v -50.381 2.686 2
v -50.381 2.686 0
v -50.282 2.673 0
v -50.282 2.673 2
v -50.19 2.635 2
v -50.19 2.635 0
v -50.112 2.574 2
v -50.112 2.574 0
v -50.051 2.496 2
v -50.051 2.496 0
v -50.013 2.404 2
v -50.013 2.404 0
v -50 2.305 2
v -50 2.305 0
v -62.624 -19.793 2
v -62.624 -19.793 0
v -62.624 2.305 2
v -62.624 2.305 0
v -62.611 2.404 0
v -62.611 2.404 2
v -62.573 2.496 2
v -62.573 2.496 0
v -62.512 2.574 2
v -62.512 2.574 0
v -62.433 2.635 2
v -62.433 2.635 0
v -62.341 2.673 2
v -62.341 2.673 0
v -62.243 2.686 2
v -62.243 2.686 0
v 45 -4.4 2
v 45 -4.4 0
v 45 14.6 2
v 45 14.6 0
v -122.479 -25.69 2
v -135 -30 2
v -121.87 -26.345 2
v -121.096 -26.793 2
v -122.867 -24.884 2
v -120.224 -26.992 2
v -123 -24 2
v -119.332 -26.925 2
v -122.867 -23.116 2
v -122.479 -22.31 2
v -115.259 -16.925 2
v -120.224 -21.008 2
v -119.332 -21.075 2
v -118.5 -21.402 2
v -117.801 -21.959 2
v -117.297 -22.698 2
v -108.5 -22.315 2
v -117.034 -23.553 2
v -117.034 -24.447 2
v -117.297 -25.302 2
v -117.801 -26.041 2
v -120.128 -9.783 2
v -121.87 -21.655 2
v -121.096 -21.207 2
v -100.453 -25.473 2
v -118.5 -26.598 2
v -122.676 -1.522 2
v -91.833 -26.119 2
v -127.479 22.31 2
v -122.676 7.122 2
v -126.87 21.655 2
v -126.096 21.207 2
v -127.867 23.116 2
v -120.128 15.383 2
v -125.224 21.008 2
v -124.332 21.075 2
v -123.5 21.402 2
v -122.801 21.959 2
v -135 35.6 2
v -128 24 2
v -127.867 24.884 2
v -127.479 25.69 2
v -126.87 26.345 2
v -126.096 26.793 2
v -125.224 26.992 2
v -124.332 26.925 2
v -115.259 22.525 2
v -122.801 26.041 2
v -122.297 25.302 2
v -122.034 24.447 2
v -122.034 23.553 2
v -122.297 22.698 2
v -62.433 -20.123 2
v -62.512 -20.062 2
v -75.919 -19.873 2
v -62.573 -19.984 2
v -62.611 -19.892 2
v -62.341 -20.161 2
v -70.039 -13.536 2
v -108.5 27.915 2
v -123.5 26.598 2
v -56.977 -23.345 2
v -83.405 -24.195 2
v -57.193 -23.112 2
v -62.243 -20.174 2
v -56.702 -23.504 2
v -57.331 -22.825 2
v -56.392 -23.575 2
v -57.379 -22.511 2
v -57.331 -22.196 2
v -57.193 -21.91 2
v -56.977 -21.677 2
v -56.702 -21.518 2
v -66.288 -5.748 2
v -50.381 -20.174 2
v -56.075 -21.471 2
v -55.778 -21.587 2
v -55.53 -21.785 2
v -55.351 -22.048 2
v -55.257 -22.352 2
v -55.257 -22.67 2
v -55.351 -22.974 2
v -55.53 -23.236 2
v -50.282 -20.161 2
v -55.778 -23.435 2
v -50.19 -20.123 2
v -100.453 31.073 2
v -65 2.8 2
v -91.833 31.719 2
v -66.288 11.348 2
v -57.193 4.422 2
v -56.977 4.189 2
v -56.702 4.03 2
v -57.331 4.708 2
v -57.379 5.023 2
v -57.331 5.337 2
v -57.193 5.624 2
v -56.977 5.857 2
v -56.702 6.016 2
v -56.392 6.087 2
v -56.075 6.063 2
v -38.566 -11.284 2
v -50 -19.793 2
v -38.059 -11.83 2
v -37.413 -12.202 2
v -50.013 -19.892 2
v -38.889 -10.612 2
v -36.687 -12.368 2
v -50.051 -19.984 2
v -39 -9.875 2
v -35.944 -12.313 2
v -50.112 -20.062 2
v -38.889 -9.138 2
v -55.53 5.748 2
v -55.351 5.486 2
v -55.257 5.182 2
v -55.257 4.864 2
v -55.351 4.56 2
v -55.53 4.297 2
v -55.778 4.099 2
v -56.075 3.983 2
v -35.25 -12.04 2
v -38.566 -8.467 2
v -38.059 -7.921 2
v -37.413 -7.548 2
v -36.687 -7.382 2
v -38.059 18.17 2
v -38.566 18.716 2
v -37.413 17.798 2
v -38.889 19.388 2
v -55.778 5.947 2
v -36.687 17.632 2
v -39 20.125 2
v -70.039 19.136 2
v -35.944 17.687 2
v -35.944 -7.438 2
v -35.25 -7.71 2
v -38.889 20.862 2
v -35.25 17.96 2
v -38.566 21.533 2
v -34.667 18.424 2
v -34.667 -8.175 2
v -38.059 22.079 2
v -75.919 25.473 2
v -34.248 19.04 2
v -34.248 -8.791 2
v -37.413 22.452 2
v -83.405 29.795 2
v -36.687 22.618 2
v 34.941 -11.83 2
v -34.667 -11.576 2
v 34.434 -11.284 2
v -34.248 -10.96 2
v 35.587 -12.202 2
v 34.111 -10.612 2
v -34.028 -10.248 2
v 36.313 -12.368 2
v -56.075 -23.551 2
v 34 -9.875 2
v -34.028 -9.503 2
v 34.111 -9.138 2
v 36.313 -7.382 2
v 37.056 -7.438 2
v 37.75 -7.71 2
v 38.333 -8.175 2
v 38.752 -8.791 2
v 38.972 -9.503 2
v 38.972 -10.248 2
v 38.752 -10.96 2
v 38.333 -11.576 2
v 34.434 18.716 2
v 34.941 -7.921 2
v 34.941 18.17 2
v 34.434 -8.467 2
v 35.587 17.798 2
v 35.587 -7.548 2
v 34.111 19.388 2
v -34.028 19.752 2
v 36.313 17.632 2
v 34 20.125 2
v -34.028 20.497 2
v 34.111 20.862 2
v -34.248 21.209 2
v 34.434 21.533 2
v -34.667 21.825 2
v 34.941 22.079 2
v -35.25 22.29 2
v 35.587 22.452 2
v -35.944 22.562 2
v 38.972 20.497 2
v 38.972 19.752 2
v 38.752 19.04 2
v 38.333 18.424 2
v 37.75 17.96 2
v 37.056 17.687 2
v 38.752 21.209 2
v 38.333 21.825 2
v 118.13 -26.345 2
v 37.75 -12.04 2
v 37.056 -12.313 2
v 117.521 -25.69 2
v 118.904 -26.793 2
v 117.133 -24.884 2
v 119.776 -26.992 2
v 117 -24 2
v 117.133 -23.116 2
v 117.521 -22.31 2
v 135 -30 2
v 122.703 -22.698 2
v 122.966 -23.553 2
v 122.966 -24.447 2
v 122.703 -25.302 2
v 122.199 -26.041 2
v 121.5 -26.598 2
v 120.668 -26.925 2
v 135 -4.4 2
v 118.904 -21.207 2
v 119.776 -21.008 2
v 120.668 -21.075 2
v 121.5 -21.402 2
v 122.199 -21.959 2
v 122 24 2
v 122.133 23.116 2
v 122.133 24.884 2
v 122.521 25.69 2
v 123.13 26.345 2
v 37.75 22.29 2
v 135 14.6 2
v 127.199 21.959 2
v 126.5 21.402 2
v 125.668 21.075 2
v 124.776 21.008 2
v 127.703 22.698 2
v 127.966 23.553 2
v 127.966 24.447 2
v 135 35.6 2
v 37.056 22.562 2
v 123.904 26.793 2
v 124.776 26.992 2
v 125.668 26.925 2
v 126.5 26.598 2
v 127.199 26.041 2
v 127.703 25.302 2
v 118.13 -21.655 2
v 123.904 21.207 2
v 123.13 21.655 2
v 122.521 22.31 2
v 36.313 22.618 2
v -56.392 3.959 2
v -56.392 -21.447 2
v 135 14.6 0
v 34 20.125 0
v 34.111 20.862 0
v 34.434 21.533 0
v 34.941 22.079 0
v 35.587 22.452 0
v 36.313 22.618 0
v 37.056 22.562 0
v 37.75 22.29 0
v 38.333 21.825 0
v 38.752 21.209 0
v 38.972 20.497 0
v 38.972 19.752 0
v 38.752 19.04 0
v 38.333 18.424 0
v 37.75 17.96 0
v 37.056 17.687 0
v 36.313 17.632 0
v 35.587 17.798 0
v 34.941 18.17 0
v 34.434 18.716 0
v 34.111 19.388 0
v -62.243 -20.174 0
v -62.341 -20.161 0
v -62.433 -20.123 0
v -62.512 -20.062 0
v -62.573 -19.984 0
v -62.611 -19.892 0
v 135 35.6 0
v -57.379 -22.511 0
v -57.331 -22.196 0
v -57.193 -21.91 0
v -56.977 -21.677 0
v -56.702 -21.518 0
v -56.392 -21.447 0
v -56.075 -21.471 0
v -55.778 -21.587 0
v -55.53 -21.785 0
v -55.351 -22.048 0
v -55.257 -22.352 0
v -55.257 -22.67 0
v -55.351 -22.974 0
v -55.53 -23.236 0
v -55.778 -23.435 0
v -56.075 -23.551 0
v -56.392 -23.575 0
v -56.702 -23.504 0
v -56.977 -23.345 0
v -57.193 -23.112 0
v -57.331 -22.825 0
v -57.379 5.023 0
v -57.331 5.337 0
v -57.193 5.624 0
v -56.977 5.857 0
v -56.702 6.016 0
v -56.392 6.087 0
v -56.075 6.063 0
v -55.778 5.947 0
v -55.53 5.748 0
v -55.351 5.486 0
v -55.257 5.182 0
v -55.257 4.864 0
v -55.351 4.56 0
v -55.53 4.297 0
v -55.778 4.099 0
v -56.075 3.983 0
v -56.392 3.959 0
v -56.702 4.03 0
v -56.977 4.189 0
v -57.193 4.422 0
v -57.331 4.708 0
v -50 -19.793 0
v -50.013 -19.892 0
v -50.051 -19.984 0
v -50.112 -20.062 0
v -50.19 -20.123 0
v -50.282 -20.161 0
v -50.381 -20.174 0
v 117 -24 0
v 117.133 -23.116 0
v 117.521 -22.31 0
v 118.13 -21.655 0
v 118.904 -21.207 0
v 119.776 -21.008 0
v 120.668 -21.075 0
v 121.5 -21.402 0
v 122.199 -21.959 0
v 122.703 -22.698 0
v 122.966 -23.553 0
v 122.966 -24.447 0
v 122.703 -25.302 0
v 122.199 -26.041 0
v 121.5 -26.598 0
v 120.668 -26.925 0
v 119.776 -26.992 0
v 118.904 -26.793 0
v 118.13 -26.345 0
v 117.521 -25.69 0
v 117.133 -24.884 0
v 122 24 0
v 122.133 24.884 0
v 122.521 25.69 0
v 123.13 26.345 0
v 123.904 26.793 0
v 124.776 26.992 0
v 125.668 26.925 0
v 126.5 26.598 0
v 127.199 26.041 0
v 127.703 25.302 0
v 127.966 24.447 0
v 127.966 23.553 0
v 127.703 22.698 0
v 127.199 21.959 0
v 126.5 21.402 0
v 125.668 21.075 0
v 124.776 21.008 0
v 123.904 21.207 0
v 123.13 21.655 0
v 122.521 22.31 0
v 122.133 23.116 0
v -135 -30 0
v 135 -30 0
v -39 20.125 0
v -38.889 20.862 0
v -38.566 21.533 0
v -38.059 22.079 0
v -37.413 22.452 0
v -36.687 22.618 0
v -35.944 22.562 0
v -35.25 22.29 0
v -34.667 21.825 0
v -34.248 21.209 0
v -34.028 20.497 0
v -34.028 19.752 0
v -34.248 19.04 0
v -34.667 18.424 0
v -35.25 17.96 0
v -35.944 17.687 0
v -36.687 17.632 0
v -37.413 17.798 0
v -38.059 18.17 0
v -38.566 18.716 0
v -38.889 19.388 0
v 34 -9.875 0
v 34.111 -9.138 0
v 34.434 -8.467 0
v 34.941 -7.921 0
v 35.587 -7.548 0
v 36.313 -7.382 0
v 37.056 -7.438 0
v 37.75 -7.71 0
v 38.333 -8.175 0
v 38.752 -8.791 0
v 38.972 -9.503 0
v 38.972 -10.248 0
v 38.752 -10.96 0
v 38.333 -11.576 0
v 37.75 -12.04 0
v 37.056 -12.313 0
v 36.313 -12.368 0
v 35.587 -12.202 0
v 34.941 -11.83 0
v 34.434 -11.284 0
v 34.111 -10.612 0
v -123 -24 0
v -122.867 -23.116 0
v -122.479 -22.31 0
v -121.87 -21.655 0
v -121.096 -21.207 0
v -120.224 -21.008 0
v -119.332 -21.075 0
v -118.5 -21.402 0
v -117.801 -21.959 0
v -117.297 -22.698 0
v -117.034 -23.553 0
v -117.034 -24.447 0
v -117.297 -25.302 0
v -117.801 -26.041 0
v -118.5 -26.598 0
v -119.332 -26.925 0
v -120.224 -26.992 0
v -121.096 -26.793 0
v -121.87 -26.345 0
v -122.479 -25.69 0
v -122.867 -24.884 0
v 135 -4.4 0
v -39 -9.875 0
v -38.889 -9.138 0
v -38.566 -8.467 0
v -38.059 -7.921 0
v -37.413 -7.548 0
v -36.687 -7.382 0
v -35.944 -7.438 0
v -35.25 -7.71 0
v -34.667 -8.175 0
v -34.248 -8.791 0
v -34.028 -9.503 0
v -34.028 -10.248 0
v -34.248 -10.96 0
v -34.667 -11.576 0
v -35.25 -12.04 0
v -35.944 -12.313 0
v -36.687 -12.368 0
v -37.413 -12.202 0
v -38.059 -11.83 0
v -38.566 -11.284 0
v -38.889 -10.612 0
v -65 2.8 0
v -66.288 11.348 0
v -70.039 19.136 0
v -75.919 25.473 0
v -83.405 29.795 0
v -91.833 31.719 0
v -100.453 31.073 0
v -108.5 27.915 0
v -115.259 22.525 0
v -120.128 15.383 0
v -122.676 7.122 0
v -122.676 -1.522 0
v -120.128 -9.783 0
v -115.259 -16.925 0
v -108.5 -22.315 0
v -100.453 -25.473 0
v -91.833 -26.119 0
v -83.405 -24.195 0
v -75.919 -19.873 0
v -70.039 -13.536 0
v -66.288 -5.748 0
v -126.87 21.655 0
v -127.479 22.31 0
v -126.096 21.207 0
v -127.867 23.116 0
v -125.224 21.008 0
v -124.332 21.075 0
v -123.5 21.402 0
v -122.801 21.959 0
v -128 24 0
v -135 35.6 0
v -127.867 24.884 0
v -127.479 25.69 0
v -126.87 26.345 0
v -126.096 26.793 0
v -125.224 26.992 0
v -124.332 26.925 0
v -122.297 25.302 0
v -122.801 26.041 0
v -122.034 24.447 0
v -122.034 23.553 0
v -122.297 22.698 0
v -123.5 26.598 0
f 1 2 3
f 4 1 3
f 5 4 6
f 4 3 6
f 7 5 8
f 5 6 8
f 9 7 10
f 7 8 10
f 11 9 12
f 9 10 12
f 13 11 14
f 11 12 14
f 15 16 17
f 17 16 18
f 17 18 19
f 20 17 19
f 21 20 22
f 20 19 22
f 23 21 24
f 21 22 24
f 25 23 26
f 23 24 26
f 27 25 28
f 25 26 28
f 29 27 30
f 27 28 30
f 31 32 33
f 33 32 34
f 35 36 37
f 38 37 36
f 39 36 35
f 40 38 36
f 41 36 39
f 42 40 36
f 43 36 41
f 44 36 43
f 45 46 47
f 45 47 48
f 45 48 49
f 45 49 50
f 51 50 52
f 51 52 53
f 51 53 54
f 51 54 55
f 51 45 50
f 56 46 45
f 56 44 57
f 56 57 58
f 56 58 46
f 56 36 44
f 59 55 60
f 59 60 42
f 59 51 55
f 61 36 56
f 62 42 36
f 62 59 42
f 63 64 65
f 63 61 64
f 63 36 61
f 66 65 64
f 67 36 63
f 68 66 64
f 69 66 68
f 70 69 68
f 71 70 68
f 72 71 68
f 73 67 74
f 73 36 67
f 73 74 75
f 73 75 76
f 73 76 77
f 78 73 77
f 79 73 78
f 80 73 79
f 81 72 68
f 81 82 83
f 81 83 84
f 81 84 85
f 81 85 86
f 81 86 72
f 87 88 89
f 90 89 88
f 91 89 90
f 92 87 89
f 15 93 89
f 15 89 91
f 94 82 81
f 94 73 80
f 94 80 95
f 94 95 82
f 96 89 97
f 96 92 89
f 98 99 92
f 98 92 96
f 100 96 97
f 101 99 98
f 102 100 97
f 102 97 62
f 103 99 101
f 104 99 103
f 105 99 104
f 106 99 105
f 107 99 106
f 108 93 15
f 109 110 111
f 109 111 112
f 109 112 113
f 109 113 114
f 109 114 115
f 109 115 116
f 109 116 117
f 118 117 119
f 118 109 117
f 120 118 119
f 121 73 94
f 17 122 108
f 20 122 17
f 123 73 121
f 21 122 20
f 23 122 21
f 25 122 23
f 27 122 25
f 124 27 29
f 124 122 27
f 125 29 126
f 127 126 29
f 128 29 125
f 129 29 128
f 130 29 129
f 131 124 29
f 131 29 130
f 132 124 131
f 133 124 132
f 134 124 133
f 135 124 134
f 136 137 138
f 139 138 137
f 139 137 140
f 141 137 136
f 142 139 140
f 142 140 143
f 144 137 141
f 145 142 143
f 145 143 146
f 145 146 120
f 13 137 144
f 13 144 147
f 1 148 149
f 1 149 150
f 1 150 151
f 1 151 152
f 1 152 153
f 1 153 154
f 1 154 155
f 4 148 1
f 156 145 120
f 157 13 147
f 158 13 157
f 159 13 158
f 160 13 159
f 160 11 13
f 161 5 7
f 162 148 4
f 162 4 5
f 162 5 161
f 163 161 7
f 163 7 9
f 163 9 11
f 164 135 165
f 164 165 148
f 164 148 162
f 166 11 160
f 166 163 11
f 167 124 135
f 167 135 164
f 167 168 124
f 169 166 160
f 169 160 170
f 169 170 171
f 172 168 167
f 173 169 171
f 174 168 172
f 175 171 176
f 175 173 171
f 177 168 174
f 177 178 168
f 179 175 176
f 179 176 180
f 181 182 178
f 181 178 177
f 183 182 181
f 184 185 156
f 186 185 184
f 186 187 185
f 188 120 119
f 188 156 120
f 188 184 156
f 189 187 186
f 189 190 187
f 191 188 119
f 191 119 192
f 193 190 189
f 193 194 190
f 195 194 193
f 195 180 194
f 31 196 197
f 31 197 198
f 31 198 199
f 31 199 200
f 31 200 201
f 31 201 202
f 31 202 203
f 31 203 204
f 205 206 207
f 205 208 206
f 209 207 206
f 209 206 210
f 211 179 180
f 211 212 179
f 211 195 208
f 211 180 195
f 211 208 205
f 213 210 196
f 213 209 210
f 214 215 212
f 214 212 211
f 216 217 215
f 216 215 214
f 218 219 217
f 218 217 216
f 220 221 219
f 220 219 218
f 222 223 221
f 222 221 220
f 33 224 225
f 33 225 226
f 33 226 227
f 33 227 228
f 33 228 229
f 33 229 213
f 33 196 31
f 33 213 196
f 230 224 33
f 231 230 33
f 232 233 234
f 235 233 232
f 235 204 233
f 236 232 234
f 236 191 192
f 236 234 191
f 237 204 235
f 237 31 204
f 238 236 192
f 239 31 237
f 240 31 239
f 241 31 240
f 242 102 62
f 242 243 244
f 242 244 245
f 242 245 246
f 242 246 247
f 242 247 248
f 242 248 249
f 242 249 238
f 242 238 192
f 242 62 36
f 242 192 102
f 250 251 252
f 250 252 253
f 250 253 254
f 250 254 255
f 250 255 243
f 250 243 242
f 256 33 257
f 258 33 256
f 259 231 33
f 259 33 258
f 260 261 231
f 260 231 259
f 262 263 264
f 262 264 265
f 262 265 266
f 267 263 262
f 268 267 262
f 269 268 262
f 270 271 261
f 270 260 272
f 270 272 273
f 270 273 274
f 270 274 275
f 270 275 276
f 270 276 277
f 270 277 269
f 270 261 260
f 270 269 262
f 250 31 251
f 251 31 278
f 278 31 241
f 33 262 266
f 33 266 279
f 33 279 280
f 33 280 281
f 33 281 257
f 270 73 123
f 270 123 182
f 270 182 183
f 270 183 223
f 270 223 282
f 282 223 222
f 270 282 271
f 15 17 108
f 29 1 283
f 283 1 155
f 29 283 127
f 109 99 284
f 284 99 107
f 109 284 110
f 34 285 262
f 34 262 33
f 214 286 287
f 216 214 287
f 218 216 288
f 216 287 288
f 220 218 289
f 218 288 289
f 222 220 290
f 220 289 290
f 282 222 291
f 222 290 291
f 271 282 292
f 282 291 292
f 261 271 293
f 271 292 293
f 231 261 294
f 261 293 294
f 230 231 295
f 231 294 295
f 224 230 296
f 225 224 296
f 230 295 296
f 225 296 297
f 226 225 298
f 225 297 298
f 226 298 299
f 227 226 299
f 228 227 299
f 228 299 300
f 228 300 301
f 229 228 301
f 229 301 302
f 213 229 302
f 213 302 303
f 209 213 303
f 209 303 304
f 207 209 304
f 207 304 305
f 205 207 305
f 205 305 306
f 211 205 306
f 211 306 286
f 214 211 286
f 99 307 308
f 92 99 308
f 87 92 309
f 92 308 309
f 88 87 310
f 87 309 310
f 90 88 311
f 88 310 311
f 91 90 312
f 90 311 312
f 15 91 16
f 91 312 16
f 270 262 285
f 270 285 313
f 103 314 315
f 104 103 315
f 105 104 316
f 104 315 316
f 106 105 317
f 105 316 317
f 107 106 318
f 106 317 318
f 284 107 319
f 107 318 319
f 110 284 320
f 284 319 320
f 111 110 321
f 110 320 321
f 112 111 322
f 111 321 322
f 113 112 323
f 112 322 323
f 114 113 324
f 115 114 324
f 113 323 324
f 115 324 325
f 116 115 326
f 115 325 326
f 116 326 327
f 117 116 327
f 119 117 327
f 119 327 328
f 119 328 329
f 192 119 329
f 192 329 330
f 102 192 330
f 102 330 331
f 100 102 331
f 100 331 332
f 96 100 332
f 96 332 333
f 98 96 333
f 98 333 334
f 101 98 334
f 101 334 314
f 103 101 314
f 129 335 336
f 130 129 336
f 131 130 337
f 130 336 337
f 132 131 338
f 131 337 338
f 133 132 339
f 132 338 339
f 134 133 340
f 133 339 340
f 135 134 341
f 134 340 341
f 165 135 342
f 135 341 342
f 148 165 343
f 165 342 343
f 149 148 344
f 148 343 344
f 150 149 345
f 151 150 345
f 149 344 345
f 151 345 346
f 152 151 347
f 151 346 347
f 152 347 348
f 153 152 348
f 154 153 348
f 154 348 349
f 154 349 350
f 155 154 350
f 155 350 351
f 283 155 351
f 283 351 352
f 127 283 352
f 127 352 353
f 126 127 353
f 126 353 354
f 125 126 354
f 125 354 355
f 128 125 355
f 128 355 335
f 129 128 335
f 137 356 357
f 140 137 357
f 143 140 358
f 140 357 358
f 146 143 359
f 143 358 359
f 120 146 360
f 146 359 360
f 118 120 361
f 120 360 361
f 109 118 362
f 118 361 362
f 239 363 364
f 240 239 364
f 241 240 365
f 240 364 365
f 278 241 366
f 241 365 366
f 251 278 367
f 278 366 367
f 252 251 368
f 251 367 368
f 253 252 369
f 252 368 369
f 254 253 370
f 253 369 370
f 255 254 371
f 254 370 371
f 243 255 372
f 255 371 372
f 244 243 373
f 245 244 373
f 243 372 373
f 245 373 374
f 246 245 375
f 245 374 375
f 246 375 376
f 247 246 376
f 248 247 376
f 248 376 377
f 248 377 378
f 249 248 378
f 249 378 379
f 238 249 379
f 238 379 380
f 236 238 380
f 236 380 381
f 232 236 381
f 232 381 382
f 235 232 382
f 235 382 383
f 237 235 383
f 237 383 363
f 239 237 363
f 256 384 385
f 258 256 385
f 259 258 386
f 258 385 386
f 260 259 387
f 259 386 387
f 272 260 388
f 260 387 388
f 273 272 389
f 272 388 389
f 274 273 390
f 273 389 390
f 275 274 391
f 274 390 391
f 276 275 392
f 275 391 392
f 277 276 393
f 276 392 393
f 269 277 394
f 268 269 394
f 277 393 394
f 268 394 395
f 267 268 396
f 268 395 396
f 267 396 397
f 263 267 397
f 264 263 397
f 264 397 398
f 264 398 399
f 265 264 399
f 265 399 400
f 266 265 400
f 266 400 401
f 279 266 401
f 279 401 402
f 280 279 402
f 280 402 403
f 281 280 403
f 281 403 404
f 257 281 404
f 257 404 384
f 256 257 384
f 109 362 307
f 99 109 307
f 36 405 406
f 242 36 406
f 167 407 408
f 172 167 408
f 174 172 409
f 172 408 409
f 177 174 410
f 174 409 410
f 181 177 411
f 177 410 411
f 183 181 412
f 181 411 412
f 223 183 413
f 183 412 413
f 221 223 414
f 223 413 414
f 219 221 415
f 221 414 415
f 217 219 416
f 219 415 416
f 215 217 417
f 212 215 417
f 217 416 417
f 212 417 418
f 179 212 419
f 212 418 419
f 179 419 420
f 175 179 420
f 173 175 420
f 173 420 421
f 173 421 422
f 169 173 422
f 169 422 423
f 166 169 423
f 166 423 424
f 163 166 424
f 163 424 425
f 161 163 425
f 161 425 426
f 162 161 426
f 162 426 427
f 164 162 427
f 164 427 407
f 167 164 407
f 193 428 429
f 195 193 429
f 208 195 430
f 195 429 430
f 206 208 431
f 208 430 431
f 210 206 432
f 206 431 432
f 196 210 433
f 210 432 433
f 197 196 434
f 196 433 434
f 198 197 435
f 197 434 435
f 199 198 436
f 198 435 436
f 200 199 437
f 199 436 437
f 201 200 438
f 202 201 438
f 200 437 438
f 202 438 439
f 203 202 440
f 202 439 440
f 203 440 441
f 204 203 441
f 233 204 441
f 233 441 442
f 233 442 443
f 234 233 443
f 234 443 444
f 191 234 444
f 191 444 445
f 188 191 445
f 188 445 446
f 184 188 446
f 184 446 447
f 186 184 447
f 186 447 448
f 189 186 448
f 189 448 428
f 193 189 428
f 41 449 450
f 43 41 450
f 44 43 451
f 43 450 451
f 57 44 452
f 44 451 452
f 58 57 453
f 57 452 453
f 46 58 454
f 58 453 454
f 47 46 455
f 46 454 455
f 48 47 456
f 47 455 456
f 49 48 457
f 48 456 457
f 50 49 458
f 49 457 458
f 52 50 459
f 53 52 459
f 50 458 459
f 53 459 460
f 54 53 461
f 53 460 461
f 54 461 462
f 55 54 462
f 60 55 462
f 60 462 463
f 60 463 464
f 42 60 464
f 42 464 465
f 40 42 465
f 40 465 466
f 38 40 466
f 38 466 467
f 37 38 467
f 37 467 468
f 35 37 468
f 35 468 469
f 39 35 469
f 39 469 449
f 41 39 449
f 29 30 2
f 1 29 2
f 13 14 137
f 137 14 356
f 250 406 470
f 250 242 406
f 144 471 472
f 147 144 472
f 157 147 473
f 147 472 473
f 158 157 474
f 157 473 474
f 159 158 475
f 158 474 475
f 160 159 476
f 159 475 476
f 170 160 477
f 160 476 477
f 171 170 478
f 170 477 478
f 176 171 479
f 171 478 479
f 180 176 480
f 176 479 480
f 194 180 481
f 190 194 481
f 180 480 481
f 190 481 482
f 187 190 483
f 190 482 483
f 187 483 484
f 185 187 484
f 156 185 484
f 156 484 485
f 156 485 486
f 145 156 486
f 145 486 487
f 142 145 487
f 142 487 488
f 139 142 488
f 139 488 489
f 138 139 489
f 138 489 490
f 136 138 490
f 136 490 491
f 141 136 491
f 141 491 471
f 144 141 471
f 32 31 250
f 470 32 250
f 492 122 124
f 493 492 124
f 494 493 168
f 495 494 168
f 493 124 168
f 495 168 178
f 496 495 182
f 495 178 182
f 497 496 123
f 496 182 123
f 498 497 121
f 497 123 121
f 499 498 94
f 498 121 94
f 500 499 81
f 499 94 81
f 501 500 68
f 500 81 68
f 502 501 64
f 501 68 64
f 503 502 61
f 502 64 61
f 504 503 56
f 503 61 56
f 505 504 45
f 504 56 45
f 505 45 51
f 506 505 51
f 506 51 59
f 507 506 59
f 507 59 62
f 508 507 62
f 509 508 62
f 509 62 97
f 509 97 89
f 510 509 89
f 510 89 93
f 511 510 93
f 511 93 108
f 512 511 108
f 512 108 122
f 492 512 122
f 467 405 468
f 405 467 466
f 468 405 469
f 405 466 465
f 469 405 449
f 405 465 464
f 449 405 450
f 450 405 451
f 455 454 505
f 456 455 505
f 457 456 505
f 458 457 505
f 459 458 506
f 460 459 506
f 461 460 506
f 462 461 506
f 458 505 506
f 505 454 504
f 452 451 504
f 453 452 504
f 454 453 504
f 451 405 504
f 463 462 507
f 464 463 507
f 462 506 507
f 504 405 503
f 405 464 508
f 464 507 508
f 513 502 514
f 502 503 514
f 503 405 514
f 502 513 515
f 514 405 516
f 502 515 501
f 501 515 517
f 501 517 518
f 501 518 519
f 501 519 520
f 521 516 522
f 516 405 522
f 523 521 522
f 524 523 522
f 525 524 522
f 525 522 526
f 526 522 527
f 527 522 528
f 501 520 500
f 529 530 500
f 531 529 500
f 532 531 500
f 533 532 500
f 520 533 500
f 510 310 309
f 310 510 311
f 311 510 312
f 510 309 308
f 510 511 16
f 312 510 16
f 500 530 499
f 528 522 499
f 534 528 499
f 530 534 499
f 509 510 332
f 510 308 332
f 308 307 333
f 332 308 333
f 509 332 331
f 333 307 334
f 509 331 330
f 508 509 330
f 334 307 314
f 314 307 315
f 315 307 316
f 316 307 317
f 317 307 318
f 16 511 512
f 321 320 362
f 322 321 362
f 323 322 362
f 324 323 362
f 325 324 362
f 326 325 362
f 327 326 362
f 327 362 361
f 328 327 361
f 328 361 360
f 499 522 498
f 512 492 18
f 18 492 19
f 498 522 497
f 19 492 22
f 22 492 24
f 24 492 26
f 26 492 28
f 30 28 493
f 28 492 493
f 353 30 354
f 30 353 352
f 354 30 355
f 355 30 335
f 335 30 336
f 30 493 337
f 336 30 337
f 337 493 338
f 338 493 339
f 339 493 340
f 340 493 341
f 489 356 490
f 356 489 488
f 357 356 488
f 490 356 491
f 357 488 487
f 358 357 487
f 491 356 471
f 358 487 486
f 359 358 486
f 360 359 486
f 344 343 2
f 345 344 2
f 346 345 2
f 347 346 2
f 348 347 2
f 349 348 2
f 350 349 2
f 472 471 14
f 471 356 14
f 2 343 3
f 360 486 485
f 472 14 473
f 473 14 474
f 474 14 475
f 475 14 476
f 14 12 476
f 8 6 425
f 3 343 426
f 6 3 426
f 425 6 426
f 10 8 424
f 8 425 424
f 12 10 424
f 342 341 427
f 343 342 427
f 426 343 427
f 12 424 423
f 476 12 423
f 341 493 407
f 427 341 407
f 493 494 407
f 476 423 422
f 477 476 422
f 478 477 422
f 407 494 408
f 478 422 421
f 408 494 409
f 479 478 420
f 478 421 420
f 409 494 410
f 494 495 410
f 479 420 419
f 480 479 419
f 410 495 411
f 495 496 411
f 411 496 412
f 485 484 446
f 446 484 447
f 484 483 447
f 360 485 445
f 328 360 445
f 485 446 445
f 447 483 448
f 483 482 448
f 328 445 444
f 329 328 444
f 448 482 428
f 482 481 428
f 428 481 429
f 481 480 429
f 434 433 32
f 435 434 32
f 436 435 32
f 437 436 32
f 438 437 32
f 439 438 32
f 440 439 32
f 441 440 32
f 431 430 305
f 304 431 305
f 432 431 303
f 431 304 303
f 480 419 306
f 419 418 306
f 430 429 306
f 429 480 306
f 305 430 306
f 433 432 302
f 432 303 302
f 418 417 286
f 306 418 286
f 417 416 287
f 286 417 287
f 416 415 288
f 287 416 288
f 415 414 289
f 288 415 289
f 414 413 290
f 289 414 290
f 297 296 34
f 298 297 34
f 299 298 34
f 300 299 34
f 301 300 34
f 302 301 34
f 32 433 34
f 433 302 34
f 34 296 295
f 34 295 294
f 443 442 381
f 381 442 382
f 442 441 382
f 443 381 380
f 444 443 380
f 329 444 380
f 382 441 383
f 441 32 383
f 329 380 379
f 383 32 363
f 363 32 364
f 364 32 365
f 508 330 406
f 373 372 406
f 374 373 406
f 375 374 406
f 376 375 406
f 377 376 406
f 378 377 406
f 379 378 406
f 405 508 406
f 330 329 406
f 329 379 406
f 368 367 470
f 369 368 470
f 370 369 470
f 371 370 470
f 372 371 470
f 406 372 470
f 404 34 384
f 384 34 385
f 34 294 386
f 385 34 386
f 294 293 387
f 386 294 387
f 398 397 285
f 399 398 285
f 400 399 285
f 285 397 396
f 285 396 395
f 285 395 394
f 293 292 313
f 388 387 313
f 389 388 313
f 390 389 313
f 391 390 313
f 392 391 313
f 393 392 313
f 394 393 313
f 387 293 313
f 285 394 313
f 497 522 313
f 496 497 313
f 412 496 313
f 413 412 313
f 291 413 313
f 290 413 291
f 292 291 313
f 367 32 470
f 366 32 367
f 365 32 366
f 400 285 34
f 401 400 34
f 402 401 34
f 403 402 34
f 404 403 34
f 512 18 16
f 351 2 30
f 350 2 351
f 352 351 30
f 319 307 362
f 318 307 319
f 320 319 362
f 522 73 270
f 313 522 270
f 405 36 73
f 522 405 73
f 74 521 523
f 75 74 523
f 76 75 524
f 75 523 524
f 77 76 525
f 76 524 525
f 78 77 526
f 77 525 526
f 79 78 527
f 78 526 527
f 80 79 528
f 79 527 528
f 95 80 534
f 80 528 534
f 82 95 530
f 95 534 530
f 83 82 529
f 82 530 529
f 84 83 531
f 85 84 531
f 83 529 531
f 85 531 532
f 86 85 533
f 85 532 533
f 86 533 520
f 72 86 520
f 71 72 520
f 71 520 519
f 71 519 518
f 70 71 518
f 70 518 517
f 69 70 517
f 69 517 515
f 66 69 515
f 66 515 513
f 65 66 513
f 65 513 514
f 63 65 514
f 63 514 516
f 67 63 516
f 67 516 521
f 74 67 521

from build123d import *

# Parameters (mm, degrees)
SKETCH1_W           = 270
SKETCH1_H           = 60
BOSS_EXTRUDE1_DEPTH = 2
SKETCH6_W           = 270
SKETCH6_H           = 5.6
BOSS_EXTRUDE2_DEPTH = 2
SKETCH7_R           = 2.5
SKETCH7_R_2         = 3
CUT_EXTRUDE1_DEPTH  = 140.629366539
SKETCH8_W           = 90
SKETCH8_H           = 10
CUT_EXTRUDE2_DEPTH  = 140.629366539
SKETCH9_R           = 29
CUT_EXTRUDE3_DEPTH  = 10
SKETCH10_R          = 1.0668
CUT_EXTRUDE4_DEPTH  = 10
SKETCH11_W          = 90
SKETCH11_H          = 9
CUT_EXTRUDE5_DEPTH  = 10


with BuildPart() as part:
    # Sketch1 → Boss-Extrude1 (new body)
    with BuildSketch(Plane.XY):
        Rectangle(SKETCH1_W, SKETCH1_H)
    extrude(amount=BOSS_EXTRUDE1_DEPTH)

    # Sketch6 → Boss-Extrude2 (add)
    with BuildSketch(Plane.XY.offset(2)):
        with Locations((0, 32.8)):
            Rectangle(SKETCH6_W, SKETCH6_H)
    extrude(amount=-BOSS_EXTRUDE2_DEPTH)

    # Sketch7 → Cut-Extrude1 (cut, through all)
    with BuildSketch(Plane(origin=(0, 0, 0), x_dir=(-1, 0, 0), z_dir=(0, 0, -1))):
        with Locations((-36.5, 20.124709067)):
            Circle(SKETCH7_R)
        with Locations((-36.5, -9.875290933)):
            Circle(SKETCH7_R)
        with Locations((36.5, -9.875290933)):
            Circle(SKETCH7_R)
        with Locations((36.5, 20.124709067)):
            Circle(SKETCH7_R)
        with Locations((125, 24)):
            Circle(SKETCH7_R_2)
        with Locations((120, -24)):
            Circle(SKETCH7_R_2)
        with Locations((-125, 24)):
            Circle(SKETCH7_R_2)
        with Locations((-120, -24)):
            Circle(SKETCH7_R_2)
    extrude(amount=-CUT_EXTRUDE1_DEPTH, mode=Mode.SUBTRACT)

    # Sketch8 → Cut-Extrude2 (cut, through all)
    with BuildSketch(Plane(origin=(0, 0, 0), x_dir=(-1, 0, 0), z_dir=(0, 0, -1))):
        with Locations((-90, 9.6)):
            Rectangle(SKETCH8_W, SKETCH8_H)
    extrude(amount=-CUT_EXTRUDE2_DEPTH, mode=Mode.SUBTRACT)

    # Sketch9 → Cut-Extrude3 (cut)
    with BuildSketch(Plane.XY.offset(2)):
        with Locations((-94, 2.8)):
            Circle(SKETCH9_R)
    extrude(amount=-CUT_EXTRUDE3_DEPTH, mode=Mode.SUBTRACT)

    # Sketch10 → Cut-Extrude4 (cut)
    with BuildSketch(Plane(origin=(0, 0, 0), x_dir=(-1, 0, 0), z_dir=(0, 0, -1))):
        with Locations((56.3119, -22.5108)):
            Circle(SKETCH10_R)
        with Locations((56.3119, 5.0228)):
            Circle(SKETCH10_R)
        with BuildLine():
            Line((62.6238, -19.793), (62.6238, 2.305))
            ThreePointArc((62.6238, 2.305), (62.512207684, 2.574407684), (62.2428, 2.686))
            Line((62.2428, 2.686), (50.381, 2.686))
            ThreePointArc((50.381, 2.686), (50.111592316, 2.574407684), (50, 2.305))
            Line((50, 2.305), (50, -19.793))
            ThreePointArc((50, -19.793), (50.111592316, -20.062407684), (50.381, -20.174))
            Line((50.381, -20.174), (62.2428, -20.174))
            ThreePointArc((62.2428, -20.174), (62.512207684, -20.062407684), (62.6238, -19.793))
        make_face()
    extrude(amount=-CUT_EXTRUDE4_DEPTH, mode=Mode.SUBTRACT)

    # Sketch11 → Cut-Extrude5 (cut)
    with BuildSketch(Plane.XY.offset(2)):
        with Locations((90, 0.1)):
            Rectangle(SKETCH11_W, SKETCH11_H)
    extrude(amount=-CUT_EXTRUDE5_DEPTH, mode=Mode.SUBTRACT)


solid = part.part
